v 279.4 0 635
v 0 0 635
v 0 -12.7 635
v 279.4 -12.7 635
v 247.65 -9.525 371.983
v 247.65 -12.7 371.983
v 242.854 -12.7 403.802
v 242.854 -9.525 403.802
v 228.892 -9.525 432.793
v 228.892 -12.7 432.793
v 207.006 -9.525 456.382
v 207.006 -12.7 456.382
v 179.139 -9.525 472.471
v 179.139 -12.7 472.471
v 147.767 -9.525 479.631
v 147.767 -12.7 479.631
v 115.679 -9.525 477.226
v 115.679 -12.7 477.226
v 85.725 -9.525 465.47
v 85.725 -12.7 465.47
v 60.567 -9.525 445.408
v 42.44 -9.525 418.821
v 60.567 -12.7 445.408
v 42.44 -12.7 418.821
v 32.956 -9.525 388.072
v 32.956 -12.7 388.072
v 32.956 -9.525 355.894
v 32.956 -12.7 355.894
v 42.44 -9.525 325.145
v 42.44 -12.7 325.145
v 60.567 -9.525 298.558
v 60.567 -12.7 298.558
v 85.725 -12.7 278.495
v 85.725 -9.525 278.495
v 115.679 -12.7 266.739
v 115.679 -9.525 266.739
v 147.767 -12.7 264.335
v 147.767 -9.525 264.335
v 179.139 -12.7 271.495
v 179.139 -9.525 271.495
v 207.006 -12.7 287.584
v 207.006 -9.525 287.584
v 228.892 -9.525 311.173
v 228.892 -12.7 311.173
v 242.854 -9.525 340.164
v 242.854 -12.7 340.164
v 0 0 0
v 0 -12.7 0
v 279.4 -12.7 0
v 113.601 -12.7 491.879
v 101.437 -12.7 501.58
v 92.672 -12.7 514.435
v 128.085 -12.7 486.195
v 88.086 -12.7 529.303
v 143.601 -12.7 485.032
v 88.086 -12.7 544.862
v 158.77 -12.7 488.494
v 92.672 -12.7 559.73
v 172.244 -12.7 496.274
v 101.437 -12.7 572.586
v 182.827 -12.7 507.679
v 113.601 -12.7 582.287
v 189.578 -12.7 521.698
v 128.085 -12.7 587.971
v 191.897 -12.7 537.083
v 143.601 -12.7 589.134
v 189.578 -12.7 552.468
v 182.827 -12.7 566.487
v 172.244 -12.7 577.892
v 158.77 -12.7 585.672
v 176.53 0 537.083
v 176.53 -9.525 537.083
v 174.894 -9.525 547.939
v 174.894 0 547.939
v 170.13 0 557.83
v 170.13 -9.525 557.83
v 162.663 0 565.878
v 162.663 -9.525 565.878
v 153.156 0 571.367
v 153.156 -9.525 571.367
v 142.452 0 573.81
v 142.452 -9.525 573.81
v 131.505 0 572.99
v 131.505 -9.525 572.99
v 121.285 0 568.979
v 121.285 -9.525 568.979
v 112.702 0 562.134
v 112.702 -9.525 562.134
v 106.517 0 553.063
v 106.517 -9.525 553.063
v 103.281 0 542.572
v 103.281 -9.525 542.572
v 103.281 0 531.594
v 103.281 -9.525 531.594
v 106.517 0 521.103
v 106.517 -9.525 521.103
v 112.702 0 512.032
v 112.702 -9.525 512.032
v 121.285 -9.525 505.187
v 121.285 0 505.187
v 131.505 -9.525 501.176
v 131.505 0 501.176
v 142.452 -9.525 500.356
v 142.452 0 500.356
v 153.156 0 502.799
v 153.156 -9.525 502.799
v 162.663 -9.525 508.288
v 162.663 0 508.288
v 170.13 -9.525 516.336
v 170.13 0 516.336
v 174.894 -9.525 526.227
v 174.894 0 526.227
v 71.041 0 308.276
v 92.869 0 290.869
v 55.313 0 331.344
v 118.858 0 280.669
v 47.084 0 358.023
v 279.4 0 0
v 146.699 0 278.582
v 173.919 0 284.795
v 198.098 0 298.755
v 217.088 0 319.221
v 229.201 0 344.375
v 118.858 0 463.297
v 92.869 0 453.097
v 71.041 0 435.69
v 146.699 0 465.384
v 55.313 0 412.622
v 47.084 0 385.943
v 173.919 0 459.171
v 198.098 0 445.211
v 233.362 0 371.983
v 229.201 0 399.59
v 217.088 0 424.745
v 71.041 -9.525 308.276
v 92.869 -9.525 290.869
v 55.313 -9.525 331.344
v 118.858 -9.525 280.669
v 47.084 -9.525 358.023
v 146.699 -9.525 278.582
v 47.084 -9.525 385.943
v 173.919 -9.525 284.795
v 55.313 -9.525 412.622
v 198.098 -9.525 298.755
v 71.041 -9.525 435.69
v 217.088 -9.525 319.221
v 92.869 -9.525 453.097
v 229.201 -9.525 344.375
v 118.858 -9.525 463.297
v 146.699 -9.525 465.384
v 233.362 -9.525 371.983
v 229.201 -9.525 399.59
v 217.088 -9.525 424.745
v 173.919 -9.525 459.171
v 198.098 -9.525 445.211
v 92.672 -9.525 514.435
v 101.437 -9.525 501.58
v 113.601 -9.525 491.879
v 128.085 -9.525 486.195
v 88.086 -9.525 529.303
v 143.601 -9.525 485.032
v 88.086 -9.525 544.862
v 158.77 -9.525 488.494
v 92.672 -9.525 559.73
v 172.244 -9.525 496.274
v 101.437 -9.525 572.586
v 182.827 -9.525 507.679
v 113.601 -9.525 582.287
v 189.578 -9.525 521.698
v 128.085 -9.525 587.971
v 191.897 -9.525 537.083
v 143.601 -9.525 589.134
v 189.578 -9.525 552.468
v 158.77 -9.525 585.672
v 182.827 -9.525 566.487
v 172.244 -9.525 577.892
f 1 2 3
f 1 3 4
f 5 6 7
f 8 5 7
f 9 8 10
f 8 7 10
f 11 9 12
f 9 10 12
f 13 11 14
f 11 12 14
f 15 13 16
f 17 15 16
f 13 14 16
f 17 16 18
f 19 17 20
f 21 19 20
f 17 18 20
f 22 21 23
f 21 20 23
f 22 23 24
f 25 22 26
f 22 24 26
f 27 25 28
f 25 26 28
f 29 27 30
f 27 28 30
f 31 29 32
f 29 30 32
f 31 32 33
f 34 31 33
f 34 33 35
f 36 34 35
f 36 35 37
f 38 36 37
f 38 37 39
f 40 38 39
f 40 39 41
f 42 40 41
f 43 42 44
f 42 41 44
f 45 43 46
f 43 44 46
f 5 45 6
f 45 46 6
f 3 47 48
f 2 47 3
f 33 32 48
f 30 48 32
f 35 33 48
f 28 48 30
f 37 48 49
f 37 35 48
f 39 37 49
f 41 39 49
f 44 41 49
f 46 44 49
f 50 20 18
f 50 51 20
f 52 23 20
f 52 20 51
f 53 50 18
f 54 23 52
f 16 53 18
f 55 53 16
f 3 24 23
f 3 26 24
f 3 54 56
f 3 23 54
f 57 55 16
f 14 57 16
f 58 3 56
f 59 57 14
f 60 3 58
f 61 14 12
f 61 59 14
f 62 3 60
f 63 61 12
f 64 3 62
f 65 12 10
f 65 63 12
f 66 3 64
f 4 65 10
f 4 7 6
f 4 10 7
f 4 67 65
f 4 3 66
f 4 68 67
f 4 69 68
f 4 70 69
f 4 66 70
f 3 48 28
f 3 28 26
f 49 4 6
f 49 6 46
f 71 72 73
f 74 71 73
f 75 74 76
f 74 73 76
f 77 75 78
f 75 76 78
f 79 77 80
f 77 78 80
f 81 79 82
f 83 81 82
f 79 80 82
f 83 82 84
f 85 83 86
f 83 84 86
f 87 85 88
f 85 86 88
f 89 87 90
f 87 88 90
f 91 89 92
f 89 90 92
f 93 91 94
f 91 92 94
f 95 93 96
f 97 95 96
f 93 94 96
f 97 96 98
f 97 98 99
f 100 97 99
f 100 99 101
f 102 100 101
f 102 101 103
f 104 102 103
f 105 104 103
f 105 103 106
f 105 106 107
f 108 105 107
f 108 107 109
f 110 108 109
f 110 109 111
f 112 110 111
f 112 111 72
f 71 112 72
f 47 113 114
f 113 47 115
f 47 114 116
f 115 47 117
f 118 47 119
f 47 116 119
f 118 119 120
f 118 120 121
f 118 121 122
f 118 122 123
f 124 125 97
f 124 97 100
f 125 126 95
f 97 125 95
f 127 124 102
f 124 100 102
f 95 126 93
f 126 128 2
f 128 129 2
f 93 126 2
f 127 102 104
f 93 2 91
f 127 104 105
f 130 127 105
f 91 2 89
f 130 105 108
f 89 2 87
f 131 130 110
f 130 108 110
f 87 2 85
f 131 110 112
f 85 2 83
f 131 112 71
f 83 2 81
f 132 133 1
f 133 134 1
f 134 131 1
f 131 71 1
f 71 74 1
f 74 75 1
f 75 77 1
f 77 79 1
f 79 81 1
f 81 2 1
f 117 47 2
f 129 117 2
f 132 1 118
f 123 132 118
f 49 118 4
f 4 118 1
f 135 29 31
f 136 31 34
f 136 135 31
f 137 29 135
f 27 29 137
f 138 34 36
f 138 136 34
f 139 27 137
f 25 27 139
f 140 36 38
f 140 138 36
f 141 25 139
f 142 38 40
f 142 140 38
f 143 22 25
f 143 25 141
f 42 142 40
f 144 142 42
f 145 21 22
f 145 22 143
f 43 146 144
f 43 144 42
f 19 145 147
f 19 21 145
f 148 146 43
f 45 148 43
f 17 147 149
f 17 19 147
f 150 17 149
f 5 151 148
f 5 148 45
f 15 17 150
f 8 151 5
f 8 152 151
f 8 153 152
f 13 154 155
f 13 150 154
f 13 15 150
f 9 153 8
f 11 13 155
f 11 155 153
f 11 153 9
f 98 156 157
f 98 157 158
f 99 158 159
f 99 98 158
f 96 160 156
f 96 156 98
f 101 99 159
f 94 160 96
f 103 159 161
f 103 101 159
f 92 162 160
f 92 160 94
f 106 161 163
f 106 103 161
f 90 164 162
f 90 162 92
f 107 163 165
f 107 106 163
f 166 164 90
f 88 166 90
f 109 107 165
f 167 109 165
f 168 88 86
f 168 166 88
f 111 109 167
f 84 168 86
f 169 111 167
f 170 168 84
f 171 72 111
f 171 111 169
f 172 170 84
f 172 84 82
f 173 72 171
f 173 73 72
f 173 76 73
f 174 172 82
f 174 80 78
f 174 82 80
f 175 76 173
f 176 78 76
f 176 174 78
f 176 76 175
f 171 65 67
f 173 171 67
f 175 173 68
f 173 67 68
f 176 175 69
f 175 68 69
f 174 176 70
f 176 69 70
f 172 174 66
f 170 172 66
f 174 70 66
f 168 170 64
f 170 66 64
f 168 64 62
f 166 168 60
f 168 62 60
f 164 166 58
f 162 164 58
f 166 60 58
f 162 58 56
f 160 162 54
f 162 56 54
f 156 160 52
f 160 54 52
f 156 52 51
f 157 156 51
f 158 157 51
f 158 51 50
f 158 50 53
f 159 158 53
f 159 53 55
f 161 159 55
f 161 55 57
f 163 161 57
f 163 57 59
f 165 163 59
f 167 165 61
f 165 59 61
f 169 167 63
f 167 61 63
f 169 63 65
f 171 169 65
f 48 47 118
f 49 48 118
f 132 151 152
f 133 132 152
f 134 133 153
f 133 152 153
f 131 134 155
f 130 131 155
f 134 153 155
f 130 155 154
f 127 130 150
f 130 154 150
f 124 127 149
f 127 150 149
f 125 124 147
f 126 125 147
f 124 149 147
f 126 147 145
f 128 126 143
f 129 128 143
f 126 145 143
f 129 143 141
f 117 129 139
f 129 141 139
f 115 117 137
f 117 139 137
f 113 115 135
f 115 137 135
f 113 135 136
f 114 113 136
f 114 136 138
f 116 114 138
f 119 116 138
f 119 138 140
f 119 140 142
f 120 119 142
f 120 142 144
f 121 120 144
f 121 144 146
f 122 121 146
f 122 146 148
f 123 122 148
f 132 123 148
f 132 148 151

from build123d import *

# Parameters (mm, degrees)
F0_W     = 279.4
F0_H     = 635
F1_DEPTH = 12.7
F2_R     = 52.197
F2_R_2   = 107.95
F3_DEPTH = 3.175
F4_R     = 36.83
F4_R_2   = 93.6625
F5_DEPTH = 12.701


with BuildPart() as f1:
    # F0 (on Front) → F1 (new body)
    with BuildSketch(Plane.XZ):
        with Locations((139.7, 317.5)):
            Rectangle(F0_W, F0_H)
    extrude(amount=F1_DEPTH)

    # F2 (on face) → F3 (cut)
    with BuildSketch(Plane.XZ.offset(12.7)):
        with Locations((139.7, 537.082911)):
            Circle(F2_R)
        with Locations((139.7, 371.982911)):
            Circle(F2_R_2)
    extrude(amount=-F3_DEPTH, mode=Mode.SUBTRACT)

    # F4 (on face) → F5 (cut, through all)
    with BuildSketch(Plane.XZ.offset(12.7)):
        with Locations((139.7, 537.082911)):
            Circle(F4_R)
        with Locations((139.7, 371.982911)):
            Circle(F4_R_2)
    extrude(amount=-F5_DEPTH, mode=Mode.SUBTRACT)


solid = f1.part
